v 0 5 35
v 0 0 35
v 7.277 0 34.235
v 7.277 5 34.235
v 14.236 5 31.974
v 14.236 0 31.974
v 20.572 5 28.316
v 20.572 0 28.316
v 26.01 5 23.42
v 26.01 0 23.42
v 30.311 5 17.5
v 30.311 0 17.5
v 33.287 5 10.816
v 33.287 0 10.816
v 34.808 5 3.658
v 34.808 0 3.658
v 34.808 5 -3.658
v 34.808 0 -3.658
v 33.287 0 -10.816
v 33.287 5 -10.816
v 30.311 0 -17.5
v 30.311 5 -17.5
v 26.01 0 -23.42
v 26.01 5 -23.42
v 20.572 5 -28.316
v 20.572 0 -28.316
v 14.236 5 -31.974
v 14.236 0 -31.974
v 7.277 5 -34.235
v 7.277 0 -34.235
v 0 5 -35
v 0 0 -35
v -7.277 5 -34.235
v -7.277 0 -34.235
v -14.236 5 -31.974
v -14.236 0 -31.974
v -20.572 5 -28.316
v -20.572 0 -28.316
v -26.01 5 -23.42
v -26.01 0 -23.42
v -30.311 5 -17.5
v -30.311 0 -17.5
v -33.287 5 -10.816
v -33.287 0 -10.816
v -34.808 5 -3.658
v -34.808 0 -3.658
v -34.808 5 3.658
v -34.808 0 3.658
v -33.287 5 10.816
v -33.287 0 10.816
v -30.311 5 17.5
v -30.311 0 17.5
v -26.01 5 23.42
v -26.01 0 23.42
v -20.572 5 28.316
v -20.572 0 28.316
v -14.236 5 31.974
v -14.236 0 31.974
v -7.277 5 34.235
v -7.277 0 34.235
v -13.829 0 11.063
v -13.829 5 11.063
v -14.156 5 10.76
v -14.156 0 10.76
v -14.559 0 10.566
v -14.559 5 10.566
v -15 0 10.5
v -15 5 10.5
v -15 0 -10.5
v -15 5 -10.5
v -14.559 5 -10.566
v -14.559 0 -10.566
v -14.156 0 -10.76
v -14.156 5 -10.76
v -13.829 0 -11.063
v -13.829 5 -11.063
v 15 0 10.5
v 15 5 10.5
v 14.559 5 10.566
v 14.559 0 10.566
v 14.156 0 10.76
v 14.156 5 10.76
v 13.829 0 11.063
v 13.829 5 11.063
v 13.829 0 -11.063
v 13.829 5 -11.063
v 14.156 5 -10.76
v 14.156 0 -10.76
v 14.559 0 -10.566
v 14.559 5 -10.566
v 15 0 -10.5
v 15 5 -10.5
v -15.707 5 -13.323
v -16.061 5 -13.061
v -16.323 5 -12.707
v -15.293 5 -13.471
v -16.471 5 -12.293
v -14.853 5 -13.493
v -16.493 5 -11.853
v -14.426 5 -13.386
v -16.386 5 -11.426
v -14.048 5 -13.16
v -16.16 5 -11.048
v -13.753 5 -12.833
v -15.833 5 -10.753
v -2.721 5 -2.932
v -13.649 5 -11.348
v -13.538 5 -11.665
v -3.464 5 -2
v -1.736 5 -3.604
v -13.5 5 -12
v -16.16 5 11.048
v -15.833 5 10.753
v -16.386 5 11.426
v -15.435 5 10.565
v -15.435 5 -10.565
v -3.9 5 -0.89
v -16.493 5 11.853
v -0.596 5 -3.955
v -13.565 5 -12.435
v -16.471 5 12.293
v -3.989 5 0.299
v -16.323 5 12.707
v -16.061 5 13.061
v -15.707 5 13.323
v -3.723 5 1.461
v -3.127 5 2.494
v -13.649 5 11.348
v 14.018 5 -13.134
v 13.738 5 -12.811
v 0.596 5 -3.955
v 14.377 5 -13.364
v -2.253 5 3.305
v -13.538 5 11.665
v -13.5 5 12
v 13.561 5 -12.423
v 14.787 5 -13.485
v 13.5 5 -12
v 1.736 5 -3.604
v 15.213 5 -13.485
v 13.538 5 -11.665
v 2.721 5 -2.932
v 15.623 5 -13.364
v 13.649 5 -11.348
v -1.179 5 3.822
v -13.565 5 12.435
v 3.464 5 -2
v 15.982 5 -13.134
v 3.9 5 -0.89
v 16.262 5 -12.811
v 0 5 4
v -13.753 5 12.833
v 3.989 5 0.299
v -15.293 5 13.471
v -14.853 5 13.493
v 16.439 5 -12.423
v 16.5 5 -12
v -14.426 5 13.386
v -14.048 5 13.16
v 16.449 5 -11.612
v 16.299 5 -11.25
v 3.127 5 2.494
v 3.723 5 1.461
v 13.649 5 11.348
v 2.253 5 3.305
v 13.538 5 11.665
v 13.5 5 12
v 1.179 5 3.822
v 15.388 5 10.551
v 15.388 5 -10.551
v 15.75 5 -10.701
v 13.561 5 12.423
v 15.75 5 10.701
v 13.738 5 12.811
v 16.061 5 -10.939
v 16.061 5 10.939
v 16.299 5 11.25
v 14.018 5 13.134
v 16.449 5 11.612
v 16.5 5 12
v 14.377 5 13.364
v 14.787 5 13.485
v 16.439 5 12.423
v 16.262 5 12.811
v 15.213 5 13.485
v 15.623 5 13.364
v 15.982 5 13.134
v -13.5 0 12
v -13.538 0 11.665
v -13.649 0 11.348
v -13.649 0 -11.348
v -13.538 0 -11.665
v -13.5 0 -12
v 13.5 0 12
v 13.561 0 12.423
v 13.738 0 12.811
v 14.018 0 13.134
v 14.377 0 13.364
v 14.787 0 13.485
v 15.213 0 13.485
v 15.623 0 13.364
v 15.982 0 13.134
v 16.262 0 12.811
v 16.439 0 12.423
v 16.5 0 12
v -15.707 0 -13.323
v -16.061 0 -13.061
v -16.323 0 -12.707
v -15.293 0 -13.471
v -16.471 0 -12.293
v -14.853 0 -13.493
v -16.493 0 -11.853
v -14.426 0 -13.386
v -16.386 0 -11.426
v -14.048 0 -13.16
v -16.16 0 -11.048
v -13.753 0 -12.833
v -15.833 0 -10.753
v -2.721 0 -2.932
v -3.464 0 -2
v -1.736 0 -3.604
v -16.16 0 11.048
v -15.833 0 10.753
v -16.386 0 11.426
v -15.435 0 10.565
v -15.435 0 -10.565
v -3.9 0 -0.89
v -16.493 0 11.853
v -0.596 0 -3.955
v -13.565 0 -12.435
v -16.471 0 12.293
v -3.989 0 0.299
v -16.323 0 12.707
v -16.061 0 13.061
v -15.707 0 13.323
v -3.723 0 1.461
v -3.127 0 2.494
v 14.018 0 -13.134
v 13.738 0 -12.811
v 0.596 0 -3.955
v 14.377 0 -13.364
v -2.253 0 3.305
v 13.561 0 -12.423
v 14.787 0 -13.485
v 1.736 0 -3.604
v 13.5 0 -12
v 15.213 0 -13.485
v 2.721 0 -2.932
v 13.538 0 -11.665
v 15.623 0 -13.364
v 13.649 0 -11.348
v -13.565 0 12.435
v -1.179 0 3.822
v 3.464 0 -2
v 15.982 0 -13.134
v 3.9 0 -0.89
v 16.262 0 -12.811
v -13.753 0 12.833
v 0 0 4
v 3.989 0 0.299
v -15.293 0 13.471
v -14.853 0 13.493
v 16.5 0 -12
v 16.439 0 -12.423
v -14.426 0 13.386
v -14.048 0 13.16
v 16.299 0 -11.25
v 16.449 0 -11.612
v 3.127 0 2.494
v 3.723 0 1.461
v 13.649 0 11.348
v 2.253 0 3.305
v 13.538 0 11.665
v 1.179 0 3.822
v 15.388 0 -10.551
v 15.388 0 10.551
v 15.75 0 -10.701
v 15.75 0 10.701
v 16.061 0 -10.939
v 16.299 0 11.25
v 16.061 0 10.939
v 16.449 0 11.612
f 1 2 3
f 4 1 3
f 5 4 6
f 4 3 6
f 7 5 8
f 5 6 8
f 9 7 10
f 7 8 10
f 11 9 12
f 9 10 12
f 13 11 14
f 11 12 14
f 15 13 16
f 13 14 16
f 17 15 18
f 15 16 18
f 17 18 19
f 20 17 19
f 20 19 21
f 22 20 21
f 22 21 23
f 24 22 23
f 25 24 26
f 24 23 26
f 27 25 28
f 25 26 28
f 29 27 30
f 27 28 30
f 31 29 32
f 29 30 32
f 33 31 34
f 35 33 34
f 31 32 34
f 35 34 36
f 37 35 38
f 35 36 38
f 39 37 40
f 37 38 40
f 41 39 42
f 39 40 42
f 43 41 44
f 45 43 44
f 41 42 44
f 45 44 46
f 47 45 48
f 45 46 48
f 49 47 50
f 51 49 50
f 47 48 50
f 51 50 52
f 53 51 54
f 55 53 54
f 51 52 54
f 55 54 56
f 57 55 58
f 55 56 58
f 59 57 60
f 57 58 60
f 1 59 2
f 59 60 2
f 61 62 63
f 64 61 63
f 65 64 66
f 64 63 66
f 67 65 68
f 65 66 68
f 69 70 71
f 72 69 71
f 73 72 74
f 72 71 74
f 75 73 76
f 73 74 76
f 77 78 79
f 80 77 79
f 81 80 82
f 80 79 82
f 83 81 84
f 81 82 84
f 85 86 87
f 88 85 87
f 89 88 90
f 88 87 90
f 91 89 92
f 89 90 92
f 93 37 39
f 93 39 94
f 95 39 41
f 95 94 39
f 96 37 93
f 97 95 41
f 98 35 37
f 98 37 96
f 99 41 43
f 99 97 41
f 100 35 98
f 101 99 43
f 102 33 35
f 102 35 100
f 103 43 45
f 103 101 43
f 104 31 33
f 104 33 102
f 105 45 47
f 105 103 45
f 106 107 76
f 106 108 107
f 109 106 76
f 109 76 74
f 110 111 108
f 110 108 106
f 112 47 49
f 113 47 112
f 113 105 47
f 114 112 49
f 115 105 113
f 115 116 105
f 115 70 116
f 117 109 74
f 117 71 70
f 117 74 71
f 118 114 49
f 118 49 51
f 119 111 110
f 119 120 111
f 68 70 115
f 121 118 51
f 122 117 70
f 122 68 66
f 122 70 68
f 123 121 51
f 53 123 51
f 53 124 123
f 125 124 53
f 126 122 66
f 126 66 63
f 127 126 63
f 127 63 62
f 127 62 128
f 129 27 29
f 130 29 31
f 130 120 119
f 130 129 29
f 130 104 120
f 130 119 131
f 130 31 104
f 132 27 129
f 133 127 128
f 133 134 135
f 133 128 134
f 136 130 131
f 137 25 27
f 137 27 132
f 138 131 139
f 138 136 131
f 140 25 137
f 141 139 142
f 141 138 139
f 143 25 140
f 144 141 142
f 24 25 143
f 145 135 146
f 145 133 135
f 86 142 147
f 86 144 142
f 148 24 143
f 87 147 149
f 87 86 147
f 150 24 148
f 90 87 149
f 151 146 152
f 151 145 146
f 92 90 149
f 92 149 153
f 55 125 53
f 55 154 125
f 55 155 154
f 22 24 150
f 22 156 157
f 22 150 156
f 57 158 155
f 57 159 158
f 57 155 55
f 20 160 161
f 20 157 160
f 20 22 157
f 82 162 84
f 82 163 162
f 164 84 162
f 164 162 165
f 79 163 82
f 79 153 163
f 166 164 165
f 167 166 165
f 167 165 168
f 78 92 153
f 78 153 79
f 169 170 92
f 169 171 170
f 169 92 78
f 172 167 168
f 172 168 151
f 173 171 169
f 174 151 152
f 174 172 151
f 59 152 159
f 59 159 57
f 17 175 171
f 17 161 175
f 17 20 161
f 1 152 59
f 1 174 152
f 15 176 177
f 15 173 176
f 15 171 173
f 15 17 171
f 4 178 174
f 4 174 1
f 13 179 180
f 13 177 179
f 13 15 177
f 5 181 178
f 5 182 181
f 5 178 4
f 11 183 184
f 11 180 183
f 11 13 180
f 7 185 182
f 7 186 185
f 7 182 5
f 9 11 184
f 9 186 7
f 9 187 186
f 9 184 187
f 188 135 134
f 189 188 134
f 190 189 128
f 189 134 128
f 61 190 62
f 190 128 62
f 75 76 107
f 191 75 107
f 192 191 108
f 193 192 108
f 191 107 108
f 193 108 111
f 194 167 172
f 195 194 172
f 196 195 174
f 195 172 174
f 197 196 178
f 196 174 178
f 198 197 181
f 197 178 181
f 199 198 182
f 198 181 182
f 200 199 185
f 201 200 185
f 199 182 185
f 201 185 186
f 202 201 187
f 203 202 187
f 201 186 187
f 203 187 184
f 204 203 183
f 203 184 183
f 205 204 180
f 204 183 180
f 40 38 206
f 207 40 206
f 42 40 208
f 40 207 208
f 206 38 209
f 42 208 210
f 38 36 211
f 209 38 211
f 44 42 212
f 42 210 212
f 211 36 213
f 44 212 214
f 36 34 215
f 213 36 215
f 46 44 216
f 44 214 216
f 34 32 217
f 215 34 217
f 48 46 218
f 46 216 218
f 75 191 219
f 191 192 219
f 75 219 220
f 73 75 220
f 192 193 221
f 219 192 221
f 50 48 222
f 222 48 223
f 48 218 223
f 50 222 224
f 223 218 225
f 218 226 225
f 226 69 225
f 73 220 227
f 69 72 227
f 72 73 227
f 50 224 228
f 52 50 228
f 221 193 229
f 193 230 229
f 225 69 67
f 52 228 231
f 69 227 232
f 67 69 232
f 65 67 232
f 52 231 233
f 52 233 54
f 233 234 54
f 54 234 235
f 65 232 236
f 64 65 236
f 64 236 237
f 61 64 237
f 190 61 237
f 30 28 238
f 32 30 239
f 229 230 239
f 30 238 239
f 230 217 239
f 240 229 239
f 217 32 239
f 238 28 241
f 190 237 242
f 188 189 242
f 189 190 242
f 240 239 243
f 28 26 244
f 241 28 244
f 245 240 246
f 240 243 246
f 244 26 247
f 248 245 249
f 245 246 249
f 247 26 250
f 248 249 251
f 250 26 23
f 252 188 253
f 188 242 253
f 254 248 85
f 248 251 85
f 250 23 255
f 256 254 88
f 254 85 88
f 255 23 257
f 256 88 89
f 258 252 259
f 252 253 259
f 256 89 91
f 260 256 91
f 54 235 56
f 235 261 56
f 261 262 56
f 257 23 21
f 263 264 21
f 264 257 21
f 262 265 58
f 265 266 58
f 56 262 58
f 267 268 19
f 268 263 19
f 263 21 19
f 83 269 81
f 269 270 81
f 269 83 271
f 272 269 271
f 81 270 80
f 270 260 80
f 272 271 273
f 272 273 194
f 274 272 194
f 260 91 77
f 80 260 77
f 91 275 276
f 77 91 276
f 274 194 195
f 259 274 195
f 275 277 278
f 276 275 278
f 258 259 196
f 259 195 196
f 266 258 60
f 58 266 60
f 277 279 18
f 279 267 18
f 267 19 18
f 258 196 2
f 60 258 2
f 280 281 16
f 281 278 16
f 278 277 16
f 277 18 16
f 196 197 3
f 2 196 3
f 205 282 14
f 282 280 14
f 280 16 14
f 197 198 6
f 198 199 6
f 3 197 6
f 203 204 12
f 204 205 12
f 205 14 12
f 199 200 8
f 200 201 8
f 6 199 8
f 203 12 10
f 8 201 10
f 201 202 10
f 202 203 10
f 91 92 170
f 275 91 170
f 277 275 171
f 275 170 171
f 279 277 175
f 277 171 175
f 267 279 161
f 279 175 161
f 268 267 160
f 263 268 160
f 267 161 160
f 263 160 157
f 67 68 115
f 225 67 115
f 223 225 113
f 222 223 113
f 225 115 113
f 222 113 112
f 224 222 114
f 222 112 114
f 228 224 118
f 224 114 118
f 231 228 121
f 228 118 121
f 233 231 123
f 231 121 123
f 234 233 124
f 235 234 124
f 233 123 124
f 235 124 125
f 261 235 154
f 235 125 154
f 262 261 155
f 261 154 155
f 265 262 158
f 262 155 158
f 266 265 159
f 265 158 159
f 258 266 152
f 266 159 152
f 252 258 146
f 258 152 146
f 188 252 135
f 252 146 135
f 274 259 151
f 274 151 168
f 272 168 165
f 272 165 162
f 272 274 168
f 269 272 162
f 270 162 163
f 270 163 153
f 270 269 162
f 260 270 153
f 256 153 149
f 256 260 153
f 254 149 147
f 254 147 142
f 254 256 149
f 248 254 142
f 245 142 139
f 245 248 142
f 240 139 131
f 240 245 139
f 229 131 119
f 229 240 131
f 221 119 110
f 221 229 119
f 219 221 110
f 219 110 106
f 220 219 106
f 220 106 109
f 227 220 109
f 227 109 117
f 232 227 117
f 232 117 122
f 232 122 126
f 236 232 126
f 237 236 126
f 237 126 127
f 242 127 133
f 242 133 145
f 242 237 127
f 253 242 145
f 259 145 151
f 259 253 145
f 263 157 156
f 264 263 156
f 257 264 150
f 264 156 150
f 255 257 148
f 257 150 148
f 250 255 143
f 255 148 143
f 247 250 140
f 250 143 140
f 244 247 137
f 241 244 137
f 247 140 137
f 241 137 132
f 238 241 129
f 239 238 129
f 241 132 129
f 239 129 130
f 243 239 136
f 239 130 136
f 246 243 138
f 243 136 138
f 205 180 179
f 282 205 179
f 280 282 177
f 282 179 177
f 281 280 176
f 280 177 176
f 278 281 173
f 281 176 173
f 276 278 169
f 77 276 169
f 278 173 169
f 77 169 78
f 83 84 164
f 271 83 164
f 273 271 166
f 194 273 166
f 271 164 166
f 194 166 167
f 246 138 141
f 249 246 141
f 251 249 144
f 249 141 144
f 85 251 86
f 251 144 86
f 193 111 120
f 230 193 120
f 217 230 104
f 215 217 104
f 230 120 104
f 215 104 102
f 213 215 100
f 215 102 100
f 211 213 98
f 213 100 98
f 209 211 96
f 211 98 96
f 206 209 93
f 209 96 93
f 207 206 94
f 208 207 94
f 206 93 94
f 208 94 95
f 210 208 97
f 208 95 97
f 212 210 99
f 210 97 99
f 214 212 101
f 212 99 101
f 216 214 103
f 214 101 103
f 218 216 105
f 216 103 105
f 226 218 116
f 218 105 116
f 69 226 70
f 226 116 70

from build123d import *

# Parameters (mm, degrees)
SKETCH1_R           = 35
SKETCH1_R_2         = 4
BOSS_EXTRUDE1_DEPTH = 5
CUT_EXTRUDE1_DEPTH  = 167


with BuildPart() as part:
    # Sketch1 → Boss-Extrude1 (new body)
    with BuildSketch(Plane(origin=(0, 0, 0), x_dir=(1, 0, 0), z_dir=(0, 1, 0))):
        with Locations(Location((0, 0, 0), (0, 0, 270))):
            Circle(SKETCH1_R)
        with Locations(Location((0, 0, 0), (0, 0, 270))):
            Circle(SKETCH1_R_2, mode=Mode.SUBTRACT)
    extrude(amount=BOSS_EXTRUDE1_DEPTH)

    # Sketch2 → Cut-Extrude1 (cut)
    with BuildSketch(Plane(origin=(0, 5, 0), x_dir=(1, 0, 0), z_dir=(0, 1, 0))):
        with BuildLine():
            Line((-15, -12), (-15, -10.5))
            ThreePointArc((-15, -10.5), (-16.060660172, -13.060660172), (-13.5, -12))
            Line((-13.5, -12), (-15, -12))
        make_face()
        with BuildLine():
            ThreePointArc((-13.828696786, -11.062957429), (-14.350216904, -10.648045146), (-15, -10.5))
            Line((-15, -10.5), (-15, -12))
            Line((-15, -12), (-13.828696786, -11.062957429))
        make_face()
        with BuildLine():
            ThreePointArc((-13.5, -12), (-13.584557521, -11.503489588), (-13.828696786, -11.062957429))
            Line((-13.828696786, -11.062957429), (-15, -12))
            Line((-15, -12), (-13.5, -12))
        make_face()
        with BuildLine():
            Line((-15, 10.5), (-15, 12))
            Line((-15, 12), (-13.5, 12))
            ThreePointArc((-13.5, 12), (-16.060660172, 13.060660172), (-15, 10.5))
        make_face()
        with BuildLine():
            Line((-13.5, 12), (-15, 12))
            Line((-15, 12), (-13.828696786, 11.062957429))
            ThreePointArc((-13.828696786, 11.062957429), (-13.584557521, 11.503489588), (-13.5, 12))
        make_face()
        with BuildLine():
            Line((-13.828696786, 11.062957429), (-15, 12))
            Line((-15, 12), (-15, 10.5))
            ThreePointArc((-15, 10.5), (-14.350216904, 10.648045146), (-13.828696786, 11.062957429))
        make_face()
        with BuildLine():
            ThreePointArc((16.5, 12), (15, 13.5), (13.5, 12))
            Line((13.5, 12), (15, 12))
            Line((15, 12), (15, 10.5))
            ThreePointArc((15, 10.5), (16.060660172, 10.939339828), (16.5, 12))
        make_face()
        with BuildLine():
            Line((15, 12), (13.828696786, 11.062957429))
            ThreePointArc((13.828696786, 11.062957429), (14.350216904, 10.648045146), (15, 10.5))
            Line((15, 10.5), (15, 12))
        make_face()
        with BuildLine():
            Line((15, 12), (13.5, 12))
            ThreePointArc((13.5, 12), (13.584557521, 11.503489588), (13.828696786, 11.062957429))
            Line((13.828696786, 11.062957429), (15, 12))
        make_face()
        with BuildLine():
            Line((15, -10.5), (15, -12))
            Line((15, -12), (13.5, -12))
            ThreePointArc((13.5, -12), (15, -13.5), (16.5, -12))
            ThreePointArc((16.5, -12), (16.060660172, -10.939339828), (15, -10.5))
        make_face()
        with BuildLine():
            Line((15, -12), (13.828696786, -11.062957429))
            ThreePointArc((13.828696786, -11.062957429), (13.584557521, -11.503489588), (13.5, -12))
            Line((13.5, -12), (15, -12))
        make_face()
        with BuildLine():
            ThreePointArc((15, -10.5), (14.350216904, -10.648045146), (13.828696786, -11.062957429))
            Line((13.828696786, -11.062957429), (15, -12))
            Line((15, -12), (15, -10.5))
        make_face()
    extrude(amount=-CUT_EXTRUDE1_DEPTH, mode=Mode.SUBTRACT)


solid = part.part
